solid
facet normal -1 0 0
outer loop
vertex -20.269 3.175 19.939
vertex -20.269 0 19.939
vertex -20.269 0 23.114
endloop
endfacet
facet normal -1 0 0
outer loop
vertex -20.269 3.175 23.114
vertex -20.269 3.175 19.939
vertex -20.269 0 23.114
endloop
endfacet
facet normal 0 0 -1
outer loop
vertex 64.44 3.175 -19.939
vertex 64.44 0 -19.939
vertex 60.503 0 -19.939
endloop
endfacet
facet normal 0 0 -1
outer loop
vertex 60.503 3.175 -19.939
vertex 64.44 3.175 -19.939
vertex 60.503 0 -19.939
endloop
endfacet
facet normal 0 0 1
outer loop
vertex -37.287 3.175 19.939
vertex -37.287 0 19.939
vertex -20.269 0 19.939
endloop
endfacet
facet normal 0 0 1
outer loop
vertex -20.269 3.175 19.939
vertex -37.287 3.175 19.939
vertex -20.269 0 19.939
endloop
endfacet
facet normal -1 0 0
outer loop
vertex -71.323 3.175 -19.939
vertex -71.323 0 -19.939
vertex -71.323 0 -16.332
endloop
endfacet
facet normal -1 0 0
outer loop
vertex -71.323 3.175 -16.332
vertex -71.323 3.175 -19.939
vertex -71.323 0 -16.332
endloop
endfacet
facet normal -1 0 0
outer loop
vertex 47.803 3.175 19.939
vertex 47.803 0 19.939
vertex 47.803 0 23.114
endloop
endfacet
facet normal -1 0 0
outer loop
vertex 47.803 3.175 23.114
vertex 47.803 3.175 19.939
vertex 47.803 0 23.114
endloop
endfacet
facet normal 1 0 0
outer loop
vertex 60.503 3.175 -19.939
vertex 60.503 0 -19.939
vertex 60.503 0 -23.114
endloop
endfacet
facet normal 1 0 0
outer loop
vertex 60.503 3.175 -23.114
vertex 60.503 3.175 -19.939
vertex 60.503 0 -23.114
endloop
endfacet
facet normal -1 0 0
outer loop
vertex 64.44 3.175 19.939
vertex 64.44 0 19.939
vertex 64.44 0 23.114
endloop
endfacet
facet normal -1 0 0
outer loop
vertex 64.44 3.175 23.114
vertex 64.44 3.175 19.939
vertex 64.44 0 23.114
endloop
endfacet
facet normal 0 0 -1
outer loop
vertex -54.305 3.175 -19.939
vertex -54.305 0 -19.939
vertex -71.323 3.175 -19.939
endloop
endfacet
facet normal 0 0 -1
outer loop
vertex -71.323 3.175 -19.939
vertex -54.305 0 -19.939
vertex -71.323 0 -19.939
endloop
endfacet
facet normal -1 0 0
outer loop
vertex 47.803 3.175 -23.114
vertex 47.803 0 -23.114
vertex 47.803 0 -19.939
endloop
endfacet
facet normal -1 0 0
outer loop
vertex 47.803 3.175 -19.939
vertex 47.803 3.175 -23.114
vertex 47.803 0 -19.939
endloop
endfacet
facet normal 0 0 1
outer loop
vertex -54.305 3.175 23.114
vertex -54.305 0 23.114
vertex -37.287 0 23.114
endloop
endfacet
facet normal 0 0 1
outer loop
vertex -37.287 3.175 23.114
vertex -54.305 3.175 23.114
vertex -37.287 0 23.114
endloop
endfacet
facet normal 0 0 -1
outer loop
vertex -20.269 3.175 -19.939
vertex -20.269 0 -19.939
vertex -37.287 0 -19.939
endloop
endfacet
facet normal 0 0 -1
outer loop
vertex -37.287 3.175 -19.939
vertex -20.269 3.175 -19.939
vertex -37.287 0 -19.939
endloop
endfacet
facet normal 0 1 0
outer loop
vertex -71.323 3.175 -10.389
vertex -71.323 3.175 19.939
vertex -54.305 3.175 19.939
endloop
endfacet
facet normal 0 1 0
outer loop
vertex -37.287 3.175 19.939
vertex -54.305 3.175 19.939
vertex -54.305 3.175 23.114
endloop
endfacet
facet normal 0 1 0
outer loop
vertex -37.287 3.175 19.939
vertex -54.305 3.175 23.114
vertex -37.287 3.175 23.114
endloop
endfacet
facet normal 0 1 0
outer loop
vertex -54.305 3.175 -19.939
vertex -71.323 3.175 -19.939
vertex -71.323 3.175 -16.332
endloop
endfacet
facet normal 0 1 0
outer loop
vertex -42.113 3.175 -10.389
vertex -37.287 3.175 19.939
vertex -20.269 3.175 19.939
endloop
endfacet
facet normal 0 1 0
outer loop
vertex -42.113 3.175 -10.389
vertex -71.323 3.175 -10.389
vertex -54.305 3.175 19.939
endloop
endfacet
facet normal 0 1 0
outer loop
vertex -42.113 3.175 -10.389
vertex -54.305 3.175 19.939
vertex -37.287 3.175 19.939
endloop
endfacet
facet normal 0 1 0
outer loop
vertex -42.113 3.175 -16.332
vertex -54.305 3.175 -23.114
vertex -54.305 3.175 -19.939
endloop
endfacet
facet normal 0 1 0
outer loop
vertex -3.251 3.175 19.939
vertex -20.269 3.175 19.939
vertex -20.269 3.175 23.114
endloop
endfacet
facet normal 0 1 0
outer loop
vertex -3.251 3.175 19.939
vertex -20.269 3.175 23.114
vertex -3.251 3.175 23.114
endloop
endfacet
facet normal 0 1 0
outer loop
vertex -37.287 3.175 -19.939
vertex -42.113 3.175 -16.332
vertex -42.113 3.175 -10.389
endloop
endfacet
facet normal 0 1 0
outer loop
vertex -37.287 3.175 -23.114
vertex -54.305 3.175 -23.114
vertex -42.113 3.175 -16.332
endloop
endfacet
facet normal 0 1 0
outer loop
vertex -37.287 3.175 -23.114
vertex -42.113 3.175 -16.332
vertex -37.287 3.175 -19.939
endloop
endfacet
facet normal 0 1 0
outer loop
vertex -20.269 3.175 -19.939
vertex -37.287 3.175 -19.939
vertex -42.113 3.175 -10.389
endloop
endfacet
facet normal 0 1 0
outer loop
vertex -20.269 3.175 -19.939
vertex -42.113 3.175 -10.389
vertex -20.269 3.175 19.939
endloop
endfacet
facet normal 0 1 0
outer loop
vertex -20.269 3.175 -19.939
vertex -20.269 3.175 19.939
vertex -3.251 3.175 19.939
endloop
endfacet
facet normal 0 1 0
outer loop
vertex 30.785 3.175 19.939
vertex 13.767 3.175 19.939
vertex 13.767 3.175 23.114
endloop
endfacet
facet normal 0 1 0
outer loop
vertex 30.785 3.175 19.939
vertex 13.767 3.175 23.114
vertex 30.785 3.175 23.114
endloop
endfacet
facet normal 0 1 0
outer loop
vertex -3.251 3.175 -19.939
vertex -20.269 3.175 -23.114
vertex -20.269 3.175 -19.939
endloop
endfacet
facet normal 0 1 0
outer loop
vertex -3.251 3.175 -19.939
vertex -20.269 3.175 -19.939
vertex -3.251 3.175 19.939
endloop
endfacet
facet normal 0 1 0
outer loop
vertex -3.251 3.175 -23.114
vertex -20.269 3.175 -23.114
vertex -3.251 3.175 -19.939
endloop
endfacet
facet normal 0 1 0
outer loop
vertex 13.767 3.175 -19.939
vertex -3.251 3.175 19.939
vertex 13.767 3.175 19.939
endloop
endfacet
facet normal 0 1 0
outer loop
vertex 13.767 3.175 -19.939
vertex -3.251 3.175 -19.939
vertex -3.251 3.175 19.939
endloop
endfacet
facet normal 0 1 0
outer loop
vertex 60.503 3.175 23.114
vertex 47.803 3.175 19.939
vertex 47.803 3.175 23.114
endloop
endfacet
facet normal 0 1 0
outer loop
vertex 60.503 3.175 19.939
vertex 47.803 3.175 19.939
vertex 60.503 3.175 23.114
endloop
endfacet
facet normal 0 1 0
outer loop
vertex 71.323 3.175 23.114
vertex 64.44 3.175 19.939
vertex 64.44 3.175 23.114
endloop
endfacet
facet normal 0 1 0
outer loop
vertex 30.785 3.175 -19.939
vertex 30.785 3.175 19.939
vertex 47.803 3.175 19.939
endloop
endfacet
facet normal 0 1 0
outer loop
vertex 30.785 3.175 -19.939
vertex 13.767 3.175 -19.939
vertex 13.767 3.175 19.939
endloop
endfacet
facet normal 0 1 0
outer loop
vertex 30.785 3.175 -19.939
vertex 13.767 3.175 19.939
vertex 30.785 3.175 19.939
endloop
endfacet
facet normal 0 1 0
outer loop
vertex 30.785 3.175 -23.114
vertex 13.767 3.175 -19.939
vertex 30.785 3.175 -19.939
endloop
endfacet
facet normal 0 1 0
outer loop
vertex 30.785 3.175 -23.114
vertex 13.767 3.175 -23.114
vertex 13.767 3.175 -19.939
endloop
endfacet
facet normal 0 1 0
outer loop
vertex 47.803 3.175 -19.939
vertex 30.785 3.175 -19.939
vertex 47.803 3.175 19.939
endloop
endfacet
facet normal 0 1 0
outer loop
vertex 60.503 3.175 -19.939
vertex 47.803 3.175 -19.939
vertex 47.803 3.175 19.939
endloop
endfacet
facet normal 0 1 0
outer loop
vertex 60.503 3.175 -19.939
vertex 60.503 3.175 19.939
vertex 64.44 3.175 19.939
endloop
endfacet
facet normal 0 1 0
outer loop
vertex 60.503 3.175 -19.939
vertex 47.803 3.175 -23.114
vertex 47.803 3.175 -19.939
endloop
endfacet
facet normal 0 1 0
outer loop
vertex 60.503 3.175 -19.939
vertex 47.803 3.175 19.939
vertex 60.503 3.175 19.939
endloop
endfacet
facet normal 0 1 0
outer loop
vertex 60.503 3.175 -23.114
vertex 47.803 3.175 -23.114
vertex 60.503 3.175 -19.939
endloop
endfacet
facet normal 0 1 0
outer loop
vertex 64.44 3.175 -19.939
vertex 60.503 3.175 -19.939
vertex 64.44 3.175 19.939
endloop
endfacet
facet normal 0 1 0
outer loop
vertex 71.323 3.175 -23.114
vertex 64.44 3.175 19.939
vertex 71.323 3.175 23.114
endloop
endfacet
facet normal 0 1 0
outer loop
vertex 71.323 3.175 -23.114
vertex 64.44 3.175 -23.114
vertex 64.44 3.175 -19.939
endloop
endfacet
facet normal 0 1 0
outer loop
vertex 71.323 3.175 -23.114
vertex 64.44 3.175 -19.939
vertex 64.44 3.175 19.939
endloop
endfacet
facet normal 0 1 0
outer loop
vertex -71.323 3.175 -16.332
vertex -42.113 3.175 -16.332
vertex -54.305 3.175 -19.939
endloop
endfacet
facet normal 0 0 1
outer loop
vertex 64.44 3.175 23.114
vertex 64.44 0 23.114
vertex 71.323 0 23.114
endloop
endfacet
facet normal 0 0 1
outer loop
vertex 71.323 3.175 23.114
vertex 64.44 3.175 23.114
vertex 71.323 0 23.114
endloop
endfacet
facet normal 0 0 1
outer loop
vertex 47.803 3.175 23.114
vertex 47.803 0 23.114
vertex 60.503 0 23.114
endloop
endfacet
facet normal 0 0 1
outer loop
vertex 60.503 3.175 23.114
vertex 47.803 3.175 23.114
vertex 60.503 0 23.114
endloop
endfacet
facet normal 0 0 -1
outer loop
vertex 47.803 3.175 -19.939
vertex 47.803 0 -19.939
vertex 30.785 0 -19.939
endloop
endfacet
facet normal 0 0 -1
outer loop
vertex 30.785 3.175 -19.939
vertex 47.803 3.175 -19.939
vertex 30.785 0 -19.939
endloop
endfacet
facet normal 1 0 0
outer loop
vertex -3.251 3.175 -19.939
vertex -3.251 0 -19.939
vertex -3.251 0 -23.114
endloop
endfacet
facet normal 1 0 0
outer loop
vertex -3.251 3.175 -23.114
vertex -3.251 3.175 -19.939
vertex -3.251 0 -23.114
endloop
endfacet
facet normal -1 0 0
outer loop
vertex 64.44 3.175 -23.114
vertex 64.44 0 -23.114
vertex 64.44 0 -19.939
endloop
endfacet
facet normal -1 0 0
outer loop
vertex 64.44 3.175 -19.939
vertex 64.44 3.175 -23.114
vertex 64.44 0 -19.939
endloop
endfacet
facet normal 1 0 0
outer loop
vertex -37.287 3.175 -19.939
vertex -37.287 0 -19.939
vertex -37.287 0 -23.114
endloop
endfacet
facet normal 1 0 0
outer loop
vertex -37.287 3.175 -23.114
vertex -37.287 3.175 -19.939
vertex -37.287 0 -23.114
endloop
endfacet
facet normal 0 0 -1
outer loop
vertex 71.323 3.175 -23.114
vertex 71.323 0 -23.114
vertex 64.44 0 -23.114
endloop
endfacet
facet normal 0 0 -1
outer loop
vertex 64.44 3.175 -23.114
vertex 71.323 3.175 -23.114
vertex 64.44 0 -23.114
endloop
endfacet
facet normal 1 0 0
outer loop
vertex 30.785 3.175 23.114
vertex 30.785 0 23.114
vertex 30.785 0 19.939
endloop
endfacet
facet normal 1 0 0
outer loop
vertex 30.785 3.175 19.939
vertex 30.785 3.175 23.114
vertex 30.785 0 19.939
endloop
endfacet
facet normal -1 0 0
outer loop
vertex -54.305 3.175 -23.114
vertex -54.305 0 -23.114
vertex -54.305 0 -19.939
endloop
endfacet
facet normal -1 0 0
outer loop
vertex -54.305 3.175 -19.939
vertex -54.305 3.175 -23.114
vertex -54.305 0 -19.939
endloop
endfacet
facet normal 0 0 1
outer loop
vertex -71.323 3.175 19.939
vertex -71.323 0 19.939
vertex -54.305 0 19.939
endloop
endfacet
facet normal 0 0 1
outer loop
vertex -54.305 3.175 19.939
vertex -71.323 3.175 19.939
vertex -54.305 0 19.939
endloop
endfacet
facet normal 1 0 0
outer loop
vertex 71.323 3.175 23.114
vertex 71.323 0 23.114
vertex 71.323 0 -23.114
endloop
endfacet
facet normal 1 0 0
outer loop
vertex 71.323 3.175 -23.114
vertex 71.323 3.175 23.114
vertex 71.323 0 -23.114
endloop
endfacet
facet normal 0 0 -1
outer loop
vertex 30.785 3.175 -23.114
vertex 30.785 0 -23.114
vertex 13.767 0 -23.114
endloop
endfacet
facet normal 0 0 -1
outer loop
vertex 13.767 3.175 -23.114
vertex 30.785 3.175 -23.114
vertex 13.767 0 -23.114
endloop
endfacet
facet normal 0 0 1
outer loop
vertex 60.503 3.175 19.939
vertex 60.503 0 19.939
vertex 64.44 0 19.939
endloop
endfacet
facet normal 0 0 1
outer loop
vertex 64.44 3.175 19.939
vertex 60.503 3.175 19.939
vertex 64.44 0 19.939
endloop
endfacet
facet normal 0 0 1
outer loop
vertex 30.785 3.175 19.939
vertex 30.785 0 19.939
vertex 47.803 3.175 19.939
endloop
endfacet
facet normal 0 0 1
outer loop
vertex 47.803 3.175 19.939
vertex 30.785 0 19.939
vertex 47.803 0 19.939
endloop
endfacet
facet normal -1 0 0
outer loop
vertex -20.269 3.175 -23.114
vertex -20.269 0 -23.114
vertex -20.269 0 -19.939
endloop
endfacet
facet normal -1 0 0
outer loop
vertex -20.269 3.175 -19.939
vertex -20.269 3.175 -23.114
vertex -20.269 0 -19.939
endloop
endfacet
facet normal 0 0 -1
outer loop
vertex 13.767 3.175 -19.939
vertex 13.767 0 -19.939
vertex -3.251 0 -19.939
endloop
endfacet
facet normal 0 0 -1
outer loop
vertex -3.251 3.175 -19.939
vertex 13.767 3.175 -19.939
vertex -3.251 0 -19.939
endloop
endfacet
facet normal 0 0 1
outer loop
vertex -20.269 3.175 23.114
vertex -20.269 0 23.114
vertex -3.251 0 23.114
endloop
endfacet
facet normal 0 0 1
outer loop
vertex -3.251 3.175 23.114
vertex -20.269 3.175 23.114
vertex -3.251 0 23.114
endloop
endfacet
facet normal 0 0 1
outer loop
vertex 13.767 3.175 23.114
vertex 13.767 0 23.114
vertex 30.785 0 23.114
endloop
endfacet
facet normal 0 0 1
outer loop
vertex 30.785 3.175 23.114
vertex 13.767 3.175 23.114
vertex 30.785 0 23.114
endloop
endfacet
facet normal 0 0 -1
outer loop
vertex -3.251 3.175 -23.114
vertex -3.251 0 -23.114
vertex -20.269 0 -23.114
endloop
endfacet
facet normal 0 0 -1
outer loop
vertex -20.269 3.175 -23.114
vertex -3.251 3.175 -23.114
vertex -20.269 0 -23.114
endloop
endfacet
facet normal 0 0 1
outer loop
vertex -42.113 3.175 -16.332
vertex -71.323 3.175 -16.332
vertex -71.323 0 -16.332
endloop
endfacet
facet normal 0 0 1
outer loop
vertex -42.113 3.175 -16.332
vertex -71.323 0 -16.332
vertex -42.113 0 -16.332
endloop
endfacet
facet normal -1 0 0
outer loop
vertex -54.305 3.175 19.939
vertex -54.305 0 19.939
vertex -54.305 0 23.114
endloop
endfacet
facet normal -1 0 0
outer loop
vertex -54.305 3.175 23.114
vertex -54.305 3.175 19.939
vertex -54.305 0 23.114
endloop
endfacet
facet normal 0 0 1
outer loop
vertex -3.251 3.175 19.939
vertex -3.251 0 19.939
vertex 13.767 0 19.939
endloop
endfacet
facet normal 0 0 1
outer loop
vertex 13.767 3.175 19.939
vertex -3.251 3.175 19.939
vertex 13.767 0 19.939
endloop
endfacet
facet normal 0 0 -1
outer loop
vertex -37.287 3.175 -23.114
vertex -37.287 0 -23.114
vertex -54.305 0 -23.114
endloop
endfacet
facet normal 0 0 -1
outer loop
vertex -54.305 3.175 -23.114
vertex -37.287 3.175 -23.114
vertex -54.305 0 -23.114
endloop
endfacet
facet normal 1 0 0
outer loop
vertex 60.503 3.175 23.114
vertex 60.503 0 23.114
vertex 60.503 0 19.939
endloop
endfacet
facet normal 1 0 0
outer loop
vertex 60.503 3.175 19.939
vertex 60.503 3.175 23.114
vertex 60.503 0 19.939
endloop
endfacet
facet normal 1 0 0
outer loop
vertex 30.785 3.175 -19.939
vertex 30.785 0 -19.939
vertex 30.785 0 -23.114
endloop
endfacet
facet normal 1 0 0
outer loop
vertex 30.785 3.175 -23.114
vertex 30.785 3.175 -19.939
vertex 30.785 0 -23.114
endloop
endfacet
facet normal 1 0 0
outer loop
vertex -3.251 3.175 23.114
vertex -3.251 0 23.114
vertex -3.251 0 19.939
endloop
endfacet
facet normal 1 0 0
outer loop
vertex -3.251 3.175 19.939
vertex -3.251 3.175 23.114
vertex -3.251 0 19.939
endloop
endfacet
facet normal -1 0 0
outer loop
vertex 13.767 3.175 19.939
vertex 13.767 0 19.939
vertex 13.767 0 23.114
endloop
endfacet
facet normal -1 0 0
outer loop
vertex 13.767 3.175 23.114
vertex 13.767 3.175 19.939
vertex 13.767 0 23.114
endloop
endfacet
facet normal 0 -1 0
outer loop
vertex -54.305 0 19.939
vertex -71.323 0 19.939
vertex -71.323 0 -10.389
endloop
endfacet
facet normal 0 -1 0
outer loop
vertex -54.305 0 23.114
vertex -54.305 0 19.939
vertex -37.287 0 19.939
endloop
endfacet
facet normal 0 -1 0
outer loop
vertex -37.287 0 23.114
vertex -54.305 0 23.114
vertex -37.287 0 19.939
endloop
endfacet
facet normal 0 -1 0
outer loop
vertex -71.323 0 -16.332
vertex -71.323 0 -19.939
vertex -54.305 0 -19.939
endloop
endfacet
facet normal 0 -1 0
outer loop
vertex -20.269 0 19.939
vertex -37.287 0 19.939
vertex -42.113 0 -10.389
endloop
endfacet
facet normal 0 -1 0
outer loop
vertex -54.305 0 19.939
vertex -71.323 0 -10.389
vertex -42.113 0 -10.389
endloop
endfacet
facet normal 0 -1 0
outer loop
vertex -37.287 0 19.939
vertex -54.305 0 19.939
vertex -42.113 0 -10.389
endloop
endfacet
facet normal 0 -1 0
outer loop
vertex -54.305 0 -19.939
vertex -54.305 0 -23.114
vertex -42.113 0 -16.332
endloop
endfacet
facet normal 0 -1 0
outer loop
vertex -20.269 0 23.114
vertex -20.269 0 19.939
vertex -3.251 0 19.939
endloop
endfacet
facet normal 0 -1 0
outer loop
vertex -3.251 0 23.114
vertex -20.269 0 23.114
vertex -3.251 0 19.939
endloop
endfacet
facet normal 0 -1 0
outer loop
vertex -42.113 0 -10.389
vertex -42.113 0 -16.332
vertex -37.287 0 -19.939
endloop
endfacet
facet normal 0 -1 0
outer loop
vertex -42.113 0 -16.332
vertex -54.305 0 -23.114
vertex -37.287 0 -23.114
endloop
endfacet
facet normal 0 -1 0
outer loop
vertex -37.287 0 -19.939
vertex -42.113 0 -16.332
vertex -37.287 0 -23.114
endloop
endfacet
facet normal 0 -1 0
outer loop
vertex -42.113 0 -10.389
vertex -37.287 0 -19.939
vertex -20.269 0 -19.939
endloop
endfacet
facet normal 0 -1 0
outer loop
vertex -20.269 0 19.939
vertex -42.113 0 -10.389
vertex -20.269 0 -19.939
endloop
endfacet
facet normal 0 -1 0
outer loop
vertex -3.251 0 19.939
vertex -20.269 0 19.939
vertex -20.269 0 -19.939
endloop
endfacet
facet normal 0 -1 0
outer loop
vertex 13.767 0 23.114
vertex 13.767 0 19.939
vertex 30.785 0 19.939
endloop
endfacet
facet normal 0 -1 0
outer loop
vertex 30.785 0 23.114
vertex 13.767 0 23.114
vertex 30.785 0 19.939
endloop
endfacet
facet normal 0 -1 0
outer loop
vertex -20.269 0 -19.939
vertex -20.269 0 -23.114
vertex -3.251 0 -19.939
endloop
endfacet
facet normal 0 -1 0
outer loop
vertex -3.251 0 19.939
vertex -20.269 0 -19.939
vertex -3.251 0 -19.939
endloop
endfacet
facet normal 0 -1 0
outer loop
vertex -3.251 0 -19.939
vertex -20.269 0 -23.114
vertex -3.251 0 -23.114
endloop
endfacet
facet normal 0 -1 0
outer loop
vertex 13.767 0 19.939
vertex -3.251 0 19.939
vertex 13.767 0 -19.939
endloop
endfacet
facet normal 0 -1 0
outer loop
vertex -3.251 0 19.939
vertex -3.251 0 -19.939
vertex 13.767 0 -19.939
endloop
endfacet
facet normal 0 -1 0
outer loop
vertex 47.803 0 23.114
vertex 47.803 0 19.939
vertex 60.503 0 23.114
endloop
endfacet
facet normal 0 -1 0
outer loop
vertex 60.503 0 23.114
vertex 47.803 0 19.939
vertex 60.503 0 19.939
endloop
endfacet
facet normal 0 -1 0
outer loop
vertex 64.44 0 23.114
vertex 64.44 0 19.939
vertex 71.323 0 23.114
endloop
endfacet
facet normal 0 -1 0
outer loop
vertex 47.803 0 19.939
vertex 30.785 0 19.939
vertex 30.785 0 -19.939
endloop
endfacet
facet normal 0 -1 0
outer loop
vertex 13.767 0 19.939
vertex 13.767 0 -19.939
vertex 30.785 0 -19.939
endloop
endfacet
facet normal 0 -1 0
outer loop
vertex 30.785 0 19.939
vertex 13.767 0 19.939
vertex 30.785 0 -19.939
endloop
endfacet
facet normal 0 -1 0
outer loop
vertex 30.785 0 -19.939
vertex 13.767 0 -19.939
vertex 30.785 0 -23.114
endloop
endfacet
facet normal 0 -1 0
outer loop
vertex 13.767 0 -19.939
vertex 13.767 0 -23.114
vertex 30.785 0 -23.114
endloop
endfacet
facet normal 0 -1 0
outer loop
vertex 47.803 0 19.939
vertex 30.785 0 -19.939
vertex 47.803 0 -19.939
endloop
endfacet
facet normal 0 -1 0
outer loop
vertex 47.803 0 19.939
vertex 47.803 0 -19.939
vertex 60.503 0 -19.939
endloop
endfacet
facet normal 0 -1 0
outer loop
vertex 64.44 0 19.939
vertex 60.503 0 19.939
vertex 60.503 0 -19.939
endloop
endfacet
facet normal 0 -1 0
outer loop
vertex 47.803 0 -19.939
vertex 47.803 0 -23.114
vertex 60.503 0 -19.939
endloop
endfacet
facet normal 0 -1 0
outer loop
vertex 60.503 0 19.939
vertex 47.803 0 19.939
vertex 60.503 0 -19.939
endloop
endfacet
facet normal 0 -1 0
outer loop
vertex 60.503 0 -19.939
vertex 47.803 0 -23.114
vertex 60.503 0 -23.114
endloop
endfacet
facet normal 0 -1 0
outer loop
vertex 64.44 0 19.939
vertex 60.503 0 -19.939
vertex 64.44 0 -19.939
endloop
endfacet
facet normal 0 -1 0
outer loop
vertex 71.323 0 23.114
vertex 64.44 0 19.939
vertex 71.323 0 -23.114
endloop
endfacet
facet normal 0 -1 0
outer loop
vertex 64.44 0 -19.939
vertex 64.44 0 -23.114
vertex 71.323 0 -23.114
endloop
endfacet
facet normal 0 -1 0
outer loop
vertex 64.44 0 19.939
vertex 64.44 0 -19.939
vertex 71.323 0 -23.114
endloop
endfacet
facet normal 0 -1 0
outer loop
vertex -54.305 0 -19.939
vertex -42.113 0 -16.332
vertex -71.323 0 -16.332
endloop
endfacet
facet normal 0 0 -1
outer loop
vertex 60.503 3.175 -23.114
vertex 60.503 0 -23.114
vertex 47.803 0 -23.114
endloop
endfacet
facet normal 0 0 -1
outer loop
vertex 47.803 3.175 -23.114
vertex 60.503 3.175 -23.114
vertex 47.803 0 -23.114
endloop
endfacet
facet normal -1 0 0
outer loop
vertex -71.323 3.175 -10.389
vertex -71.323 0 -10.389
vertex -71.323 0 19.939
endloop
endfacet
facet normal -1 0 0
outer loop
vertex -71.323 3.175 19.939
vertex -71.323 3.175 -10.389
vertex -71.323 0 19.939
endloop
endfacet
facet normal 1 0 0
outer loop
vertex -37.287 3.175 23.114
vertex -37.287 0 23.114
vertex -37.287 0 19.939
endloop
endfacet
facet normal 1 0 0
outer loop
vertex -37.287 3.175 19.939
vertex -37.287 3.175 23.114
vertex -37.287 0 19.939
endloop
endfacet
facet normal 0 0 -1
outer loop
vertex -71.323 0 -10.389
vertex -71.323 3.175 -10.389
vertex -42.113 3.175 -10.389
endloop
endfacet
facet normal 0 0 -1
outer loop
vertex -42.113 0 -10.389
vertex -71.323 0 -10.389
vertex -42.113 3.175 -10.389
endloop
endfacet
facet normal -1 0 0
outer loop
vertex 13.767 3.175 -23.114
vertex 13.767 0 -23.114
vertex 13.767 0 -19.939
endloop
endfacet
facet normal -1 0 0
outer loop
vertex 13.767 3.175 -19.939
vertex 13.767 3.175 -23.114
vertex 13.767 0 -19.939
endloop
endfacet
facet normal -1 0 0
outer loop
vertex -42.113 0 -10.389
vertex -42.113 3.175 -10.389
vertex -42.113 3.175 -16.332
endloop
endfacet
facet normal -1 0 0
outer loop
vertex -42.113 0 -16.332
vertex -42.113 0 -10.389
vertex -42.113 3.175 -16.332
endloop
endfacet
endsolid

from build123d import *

# Parameters (mm, degrees)
BOSS_EXTRUDE1_DEPTH = 3.175
SKETCH2_W           = 29.21
SKETCH2_H           = 5.9436
CUT_EXTRUDE2_DEPTH  = 4.064


with BuildPart() as part:
    # Sketch1 → Boss-Extrude1 (new body)
    with BuildSketch(Plane(origin=(0, 0, 0), x_dir=(1, 0, 0), z_dir=(0, 1, 0))):
        Polygon((-54.3052, -23.114), (-37.2872, -23.114), (-37.2872, -19.939), (-20.2692, -19.939), (-20.2692, -23.114), (-3.2512, -23.114), (-3.2512, -19.939), (13.7668, -19.939), (13.7668, -23.114), (30.7848, -23.114), (30.7848, -19.939), (47.8028, -19.939), (47.8028, -23.114), (60.5028, -23.114), (60.5028, -19.939), (64.4398, -19.939), (64.4398, -23.114), (71.3232, -23.114), (71.3232, 23.114), (64.4398, 23.114), (64.4398, 19.939), (60.5028, 19.939), (60.5028, 23.114), (47.8028, 23.114), (47.8028, 19.939), (30.7848, 19.939), (30.7848, 23.114), (13.7668, 23.114), (13.7668, 19.939), (-3.2512, 19.939), (-3.2512, 23.114), (-20.2692, 23.114), (-20.2692, 19.939), (-37.2872, 19.939), (-37.2872, 23.114), (-54.3052, 23.114), (-54.3052, 19.939), (-71.3232, 19.939), (-71.3232, -19.939), (-54.3052, -19.939), align=None)
    extrude(amount=BOSS_EXTRUDE1_DEPTH)

    # Sketch2 → Cut-Extrude2 (cut)
    with BuildSketch(Plane(origin=(0, 3.175, 0), x_dir=(1, 0, 0), z_dir=(0, 1, 0))):
        with Locations((-56.7182, 13.3604)):
            Rectangle(SKETCH2_W, SKETCH2_H)
    extrude(amount=-CUT_EXTRUDE2_DEPTH, mode=Mode.SUBTRACT)


solid = part.part
